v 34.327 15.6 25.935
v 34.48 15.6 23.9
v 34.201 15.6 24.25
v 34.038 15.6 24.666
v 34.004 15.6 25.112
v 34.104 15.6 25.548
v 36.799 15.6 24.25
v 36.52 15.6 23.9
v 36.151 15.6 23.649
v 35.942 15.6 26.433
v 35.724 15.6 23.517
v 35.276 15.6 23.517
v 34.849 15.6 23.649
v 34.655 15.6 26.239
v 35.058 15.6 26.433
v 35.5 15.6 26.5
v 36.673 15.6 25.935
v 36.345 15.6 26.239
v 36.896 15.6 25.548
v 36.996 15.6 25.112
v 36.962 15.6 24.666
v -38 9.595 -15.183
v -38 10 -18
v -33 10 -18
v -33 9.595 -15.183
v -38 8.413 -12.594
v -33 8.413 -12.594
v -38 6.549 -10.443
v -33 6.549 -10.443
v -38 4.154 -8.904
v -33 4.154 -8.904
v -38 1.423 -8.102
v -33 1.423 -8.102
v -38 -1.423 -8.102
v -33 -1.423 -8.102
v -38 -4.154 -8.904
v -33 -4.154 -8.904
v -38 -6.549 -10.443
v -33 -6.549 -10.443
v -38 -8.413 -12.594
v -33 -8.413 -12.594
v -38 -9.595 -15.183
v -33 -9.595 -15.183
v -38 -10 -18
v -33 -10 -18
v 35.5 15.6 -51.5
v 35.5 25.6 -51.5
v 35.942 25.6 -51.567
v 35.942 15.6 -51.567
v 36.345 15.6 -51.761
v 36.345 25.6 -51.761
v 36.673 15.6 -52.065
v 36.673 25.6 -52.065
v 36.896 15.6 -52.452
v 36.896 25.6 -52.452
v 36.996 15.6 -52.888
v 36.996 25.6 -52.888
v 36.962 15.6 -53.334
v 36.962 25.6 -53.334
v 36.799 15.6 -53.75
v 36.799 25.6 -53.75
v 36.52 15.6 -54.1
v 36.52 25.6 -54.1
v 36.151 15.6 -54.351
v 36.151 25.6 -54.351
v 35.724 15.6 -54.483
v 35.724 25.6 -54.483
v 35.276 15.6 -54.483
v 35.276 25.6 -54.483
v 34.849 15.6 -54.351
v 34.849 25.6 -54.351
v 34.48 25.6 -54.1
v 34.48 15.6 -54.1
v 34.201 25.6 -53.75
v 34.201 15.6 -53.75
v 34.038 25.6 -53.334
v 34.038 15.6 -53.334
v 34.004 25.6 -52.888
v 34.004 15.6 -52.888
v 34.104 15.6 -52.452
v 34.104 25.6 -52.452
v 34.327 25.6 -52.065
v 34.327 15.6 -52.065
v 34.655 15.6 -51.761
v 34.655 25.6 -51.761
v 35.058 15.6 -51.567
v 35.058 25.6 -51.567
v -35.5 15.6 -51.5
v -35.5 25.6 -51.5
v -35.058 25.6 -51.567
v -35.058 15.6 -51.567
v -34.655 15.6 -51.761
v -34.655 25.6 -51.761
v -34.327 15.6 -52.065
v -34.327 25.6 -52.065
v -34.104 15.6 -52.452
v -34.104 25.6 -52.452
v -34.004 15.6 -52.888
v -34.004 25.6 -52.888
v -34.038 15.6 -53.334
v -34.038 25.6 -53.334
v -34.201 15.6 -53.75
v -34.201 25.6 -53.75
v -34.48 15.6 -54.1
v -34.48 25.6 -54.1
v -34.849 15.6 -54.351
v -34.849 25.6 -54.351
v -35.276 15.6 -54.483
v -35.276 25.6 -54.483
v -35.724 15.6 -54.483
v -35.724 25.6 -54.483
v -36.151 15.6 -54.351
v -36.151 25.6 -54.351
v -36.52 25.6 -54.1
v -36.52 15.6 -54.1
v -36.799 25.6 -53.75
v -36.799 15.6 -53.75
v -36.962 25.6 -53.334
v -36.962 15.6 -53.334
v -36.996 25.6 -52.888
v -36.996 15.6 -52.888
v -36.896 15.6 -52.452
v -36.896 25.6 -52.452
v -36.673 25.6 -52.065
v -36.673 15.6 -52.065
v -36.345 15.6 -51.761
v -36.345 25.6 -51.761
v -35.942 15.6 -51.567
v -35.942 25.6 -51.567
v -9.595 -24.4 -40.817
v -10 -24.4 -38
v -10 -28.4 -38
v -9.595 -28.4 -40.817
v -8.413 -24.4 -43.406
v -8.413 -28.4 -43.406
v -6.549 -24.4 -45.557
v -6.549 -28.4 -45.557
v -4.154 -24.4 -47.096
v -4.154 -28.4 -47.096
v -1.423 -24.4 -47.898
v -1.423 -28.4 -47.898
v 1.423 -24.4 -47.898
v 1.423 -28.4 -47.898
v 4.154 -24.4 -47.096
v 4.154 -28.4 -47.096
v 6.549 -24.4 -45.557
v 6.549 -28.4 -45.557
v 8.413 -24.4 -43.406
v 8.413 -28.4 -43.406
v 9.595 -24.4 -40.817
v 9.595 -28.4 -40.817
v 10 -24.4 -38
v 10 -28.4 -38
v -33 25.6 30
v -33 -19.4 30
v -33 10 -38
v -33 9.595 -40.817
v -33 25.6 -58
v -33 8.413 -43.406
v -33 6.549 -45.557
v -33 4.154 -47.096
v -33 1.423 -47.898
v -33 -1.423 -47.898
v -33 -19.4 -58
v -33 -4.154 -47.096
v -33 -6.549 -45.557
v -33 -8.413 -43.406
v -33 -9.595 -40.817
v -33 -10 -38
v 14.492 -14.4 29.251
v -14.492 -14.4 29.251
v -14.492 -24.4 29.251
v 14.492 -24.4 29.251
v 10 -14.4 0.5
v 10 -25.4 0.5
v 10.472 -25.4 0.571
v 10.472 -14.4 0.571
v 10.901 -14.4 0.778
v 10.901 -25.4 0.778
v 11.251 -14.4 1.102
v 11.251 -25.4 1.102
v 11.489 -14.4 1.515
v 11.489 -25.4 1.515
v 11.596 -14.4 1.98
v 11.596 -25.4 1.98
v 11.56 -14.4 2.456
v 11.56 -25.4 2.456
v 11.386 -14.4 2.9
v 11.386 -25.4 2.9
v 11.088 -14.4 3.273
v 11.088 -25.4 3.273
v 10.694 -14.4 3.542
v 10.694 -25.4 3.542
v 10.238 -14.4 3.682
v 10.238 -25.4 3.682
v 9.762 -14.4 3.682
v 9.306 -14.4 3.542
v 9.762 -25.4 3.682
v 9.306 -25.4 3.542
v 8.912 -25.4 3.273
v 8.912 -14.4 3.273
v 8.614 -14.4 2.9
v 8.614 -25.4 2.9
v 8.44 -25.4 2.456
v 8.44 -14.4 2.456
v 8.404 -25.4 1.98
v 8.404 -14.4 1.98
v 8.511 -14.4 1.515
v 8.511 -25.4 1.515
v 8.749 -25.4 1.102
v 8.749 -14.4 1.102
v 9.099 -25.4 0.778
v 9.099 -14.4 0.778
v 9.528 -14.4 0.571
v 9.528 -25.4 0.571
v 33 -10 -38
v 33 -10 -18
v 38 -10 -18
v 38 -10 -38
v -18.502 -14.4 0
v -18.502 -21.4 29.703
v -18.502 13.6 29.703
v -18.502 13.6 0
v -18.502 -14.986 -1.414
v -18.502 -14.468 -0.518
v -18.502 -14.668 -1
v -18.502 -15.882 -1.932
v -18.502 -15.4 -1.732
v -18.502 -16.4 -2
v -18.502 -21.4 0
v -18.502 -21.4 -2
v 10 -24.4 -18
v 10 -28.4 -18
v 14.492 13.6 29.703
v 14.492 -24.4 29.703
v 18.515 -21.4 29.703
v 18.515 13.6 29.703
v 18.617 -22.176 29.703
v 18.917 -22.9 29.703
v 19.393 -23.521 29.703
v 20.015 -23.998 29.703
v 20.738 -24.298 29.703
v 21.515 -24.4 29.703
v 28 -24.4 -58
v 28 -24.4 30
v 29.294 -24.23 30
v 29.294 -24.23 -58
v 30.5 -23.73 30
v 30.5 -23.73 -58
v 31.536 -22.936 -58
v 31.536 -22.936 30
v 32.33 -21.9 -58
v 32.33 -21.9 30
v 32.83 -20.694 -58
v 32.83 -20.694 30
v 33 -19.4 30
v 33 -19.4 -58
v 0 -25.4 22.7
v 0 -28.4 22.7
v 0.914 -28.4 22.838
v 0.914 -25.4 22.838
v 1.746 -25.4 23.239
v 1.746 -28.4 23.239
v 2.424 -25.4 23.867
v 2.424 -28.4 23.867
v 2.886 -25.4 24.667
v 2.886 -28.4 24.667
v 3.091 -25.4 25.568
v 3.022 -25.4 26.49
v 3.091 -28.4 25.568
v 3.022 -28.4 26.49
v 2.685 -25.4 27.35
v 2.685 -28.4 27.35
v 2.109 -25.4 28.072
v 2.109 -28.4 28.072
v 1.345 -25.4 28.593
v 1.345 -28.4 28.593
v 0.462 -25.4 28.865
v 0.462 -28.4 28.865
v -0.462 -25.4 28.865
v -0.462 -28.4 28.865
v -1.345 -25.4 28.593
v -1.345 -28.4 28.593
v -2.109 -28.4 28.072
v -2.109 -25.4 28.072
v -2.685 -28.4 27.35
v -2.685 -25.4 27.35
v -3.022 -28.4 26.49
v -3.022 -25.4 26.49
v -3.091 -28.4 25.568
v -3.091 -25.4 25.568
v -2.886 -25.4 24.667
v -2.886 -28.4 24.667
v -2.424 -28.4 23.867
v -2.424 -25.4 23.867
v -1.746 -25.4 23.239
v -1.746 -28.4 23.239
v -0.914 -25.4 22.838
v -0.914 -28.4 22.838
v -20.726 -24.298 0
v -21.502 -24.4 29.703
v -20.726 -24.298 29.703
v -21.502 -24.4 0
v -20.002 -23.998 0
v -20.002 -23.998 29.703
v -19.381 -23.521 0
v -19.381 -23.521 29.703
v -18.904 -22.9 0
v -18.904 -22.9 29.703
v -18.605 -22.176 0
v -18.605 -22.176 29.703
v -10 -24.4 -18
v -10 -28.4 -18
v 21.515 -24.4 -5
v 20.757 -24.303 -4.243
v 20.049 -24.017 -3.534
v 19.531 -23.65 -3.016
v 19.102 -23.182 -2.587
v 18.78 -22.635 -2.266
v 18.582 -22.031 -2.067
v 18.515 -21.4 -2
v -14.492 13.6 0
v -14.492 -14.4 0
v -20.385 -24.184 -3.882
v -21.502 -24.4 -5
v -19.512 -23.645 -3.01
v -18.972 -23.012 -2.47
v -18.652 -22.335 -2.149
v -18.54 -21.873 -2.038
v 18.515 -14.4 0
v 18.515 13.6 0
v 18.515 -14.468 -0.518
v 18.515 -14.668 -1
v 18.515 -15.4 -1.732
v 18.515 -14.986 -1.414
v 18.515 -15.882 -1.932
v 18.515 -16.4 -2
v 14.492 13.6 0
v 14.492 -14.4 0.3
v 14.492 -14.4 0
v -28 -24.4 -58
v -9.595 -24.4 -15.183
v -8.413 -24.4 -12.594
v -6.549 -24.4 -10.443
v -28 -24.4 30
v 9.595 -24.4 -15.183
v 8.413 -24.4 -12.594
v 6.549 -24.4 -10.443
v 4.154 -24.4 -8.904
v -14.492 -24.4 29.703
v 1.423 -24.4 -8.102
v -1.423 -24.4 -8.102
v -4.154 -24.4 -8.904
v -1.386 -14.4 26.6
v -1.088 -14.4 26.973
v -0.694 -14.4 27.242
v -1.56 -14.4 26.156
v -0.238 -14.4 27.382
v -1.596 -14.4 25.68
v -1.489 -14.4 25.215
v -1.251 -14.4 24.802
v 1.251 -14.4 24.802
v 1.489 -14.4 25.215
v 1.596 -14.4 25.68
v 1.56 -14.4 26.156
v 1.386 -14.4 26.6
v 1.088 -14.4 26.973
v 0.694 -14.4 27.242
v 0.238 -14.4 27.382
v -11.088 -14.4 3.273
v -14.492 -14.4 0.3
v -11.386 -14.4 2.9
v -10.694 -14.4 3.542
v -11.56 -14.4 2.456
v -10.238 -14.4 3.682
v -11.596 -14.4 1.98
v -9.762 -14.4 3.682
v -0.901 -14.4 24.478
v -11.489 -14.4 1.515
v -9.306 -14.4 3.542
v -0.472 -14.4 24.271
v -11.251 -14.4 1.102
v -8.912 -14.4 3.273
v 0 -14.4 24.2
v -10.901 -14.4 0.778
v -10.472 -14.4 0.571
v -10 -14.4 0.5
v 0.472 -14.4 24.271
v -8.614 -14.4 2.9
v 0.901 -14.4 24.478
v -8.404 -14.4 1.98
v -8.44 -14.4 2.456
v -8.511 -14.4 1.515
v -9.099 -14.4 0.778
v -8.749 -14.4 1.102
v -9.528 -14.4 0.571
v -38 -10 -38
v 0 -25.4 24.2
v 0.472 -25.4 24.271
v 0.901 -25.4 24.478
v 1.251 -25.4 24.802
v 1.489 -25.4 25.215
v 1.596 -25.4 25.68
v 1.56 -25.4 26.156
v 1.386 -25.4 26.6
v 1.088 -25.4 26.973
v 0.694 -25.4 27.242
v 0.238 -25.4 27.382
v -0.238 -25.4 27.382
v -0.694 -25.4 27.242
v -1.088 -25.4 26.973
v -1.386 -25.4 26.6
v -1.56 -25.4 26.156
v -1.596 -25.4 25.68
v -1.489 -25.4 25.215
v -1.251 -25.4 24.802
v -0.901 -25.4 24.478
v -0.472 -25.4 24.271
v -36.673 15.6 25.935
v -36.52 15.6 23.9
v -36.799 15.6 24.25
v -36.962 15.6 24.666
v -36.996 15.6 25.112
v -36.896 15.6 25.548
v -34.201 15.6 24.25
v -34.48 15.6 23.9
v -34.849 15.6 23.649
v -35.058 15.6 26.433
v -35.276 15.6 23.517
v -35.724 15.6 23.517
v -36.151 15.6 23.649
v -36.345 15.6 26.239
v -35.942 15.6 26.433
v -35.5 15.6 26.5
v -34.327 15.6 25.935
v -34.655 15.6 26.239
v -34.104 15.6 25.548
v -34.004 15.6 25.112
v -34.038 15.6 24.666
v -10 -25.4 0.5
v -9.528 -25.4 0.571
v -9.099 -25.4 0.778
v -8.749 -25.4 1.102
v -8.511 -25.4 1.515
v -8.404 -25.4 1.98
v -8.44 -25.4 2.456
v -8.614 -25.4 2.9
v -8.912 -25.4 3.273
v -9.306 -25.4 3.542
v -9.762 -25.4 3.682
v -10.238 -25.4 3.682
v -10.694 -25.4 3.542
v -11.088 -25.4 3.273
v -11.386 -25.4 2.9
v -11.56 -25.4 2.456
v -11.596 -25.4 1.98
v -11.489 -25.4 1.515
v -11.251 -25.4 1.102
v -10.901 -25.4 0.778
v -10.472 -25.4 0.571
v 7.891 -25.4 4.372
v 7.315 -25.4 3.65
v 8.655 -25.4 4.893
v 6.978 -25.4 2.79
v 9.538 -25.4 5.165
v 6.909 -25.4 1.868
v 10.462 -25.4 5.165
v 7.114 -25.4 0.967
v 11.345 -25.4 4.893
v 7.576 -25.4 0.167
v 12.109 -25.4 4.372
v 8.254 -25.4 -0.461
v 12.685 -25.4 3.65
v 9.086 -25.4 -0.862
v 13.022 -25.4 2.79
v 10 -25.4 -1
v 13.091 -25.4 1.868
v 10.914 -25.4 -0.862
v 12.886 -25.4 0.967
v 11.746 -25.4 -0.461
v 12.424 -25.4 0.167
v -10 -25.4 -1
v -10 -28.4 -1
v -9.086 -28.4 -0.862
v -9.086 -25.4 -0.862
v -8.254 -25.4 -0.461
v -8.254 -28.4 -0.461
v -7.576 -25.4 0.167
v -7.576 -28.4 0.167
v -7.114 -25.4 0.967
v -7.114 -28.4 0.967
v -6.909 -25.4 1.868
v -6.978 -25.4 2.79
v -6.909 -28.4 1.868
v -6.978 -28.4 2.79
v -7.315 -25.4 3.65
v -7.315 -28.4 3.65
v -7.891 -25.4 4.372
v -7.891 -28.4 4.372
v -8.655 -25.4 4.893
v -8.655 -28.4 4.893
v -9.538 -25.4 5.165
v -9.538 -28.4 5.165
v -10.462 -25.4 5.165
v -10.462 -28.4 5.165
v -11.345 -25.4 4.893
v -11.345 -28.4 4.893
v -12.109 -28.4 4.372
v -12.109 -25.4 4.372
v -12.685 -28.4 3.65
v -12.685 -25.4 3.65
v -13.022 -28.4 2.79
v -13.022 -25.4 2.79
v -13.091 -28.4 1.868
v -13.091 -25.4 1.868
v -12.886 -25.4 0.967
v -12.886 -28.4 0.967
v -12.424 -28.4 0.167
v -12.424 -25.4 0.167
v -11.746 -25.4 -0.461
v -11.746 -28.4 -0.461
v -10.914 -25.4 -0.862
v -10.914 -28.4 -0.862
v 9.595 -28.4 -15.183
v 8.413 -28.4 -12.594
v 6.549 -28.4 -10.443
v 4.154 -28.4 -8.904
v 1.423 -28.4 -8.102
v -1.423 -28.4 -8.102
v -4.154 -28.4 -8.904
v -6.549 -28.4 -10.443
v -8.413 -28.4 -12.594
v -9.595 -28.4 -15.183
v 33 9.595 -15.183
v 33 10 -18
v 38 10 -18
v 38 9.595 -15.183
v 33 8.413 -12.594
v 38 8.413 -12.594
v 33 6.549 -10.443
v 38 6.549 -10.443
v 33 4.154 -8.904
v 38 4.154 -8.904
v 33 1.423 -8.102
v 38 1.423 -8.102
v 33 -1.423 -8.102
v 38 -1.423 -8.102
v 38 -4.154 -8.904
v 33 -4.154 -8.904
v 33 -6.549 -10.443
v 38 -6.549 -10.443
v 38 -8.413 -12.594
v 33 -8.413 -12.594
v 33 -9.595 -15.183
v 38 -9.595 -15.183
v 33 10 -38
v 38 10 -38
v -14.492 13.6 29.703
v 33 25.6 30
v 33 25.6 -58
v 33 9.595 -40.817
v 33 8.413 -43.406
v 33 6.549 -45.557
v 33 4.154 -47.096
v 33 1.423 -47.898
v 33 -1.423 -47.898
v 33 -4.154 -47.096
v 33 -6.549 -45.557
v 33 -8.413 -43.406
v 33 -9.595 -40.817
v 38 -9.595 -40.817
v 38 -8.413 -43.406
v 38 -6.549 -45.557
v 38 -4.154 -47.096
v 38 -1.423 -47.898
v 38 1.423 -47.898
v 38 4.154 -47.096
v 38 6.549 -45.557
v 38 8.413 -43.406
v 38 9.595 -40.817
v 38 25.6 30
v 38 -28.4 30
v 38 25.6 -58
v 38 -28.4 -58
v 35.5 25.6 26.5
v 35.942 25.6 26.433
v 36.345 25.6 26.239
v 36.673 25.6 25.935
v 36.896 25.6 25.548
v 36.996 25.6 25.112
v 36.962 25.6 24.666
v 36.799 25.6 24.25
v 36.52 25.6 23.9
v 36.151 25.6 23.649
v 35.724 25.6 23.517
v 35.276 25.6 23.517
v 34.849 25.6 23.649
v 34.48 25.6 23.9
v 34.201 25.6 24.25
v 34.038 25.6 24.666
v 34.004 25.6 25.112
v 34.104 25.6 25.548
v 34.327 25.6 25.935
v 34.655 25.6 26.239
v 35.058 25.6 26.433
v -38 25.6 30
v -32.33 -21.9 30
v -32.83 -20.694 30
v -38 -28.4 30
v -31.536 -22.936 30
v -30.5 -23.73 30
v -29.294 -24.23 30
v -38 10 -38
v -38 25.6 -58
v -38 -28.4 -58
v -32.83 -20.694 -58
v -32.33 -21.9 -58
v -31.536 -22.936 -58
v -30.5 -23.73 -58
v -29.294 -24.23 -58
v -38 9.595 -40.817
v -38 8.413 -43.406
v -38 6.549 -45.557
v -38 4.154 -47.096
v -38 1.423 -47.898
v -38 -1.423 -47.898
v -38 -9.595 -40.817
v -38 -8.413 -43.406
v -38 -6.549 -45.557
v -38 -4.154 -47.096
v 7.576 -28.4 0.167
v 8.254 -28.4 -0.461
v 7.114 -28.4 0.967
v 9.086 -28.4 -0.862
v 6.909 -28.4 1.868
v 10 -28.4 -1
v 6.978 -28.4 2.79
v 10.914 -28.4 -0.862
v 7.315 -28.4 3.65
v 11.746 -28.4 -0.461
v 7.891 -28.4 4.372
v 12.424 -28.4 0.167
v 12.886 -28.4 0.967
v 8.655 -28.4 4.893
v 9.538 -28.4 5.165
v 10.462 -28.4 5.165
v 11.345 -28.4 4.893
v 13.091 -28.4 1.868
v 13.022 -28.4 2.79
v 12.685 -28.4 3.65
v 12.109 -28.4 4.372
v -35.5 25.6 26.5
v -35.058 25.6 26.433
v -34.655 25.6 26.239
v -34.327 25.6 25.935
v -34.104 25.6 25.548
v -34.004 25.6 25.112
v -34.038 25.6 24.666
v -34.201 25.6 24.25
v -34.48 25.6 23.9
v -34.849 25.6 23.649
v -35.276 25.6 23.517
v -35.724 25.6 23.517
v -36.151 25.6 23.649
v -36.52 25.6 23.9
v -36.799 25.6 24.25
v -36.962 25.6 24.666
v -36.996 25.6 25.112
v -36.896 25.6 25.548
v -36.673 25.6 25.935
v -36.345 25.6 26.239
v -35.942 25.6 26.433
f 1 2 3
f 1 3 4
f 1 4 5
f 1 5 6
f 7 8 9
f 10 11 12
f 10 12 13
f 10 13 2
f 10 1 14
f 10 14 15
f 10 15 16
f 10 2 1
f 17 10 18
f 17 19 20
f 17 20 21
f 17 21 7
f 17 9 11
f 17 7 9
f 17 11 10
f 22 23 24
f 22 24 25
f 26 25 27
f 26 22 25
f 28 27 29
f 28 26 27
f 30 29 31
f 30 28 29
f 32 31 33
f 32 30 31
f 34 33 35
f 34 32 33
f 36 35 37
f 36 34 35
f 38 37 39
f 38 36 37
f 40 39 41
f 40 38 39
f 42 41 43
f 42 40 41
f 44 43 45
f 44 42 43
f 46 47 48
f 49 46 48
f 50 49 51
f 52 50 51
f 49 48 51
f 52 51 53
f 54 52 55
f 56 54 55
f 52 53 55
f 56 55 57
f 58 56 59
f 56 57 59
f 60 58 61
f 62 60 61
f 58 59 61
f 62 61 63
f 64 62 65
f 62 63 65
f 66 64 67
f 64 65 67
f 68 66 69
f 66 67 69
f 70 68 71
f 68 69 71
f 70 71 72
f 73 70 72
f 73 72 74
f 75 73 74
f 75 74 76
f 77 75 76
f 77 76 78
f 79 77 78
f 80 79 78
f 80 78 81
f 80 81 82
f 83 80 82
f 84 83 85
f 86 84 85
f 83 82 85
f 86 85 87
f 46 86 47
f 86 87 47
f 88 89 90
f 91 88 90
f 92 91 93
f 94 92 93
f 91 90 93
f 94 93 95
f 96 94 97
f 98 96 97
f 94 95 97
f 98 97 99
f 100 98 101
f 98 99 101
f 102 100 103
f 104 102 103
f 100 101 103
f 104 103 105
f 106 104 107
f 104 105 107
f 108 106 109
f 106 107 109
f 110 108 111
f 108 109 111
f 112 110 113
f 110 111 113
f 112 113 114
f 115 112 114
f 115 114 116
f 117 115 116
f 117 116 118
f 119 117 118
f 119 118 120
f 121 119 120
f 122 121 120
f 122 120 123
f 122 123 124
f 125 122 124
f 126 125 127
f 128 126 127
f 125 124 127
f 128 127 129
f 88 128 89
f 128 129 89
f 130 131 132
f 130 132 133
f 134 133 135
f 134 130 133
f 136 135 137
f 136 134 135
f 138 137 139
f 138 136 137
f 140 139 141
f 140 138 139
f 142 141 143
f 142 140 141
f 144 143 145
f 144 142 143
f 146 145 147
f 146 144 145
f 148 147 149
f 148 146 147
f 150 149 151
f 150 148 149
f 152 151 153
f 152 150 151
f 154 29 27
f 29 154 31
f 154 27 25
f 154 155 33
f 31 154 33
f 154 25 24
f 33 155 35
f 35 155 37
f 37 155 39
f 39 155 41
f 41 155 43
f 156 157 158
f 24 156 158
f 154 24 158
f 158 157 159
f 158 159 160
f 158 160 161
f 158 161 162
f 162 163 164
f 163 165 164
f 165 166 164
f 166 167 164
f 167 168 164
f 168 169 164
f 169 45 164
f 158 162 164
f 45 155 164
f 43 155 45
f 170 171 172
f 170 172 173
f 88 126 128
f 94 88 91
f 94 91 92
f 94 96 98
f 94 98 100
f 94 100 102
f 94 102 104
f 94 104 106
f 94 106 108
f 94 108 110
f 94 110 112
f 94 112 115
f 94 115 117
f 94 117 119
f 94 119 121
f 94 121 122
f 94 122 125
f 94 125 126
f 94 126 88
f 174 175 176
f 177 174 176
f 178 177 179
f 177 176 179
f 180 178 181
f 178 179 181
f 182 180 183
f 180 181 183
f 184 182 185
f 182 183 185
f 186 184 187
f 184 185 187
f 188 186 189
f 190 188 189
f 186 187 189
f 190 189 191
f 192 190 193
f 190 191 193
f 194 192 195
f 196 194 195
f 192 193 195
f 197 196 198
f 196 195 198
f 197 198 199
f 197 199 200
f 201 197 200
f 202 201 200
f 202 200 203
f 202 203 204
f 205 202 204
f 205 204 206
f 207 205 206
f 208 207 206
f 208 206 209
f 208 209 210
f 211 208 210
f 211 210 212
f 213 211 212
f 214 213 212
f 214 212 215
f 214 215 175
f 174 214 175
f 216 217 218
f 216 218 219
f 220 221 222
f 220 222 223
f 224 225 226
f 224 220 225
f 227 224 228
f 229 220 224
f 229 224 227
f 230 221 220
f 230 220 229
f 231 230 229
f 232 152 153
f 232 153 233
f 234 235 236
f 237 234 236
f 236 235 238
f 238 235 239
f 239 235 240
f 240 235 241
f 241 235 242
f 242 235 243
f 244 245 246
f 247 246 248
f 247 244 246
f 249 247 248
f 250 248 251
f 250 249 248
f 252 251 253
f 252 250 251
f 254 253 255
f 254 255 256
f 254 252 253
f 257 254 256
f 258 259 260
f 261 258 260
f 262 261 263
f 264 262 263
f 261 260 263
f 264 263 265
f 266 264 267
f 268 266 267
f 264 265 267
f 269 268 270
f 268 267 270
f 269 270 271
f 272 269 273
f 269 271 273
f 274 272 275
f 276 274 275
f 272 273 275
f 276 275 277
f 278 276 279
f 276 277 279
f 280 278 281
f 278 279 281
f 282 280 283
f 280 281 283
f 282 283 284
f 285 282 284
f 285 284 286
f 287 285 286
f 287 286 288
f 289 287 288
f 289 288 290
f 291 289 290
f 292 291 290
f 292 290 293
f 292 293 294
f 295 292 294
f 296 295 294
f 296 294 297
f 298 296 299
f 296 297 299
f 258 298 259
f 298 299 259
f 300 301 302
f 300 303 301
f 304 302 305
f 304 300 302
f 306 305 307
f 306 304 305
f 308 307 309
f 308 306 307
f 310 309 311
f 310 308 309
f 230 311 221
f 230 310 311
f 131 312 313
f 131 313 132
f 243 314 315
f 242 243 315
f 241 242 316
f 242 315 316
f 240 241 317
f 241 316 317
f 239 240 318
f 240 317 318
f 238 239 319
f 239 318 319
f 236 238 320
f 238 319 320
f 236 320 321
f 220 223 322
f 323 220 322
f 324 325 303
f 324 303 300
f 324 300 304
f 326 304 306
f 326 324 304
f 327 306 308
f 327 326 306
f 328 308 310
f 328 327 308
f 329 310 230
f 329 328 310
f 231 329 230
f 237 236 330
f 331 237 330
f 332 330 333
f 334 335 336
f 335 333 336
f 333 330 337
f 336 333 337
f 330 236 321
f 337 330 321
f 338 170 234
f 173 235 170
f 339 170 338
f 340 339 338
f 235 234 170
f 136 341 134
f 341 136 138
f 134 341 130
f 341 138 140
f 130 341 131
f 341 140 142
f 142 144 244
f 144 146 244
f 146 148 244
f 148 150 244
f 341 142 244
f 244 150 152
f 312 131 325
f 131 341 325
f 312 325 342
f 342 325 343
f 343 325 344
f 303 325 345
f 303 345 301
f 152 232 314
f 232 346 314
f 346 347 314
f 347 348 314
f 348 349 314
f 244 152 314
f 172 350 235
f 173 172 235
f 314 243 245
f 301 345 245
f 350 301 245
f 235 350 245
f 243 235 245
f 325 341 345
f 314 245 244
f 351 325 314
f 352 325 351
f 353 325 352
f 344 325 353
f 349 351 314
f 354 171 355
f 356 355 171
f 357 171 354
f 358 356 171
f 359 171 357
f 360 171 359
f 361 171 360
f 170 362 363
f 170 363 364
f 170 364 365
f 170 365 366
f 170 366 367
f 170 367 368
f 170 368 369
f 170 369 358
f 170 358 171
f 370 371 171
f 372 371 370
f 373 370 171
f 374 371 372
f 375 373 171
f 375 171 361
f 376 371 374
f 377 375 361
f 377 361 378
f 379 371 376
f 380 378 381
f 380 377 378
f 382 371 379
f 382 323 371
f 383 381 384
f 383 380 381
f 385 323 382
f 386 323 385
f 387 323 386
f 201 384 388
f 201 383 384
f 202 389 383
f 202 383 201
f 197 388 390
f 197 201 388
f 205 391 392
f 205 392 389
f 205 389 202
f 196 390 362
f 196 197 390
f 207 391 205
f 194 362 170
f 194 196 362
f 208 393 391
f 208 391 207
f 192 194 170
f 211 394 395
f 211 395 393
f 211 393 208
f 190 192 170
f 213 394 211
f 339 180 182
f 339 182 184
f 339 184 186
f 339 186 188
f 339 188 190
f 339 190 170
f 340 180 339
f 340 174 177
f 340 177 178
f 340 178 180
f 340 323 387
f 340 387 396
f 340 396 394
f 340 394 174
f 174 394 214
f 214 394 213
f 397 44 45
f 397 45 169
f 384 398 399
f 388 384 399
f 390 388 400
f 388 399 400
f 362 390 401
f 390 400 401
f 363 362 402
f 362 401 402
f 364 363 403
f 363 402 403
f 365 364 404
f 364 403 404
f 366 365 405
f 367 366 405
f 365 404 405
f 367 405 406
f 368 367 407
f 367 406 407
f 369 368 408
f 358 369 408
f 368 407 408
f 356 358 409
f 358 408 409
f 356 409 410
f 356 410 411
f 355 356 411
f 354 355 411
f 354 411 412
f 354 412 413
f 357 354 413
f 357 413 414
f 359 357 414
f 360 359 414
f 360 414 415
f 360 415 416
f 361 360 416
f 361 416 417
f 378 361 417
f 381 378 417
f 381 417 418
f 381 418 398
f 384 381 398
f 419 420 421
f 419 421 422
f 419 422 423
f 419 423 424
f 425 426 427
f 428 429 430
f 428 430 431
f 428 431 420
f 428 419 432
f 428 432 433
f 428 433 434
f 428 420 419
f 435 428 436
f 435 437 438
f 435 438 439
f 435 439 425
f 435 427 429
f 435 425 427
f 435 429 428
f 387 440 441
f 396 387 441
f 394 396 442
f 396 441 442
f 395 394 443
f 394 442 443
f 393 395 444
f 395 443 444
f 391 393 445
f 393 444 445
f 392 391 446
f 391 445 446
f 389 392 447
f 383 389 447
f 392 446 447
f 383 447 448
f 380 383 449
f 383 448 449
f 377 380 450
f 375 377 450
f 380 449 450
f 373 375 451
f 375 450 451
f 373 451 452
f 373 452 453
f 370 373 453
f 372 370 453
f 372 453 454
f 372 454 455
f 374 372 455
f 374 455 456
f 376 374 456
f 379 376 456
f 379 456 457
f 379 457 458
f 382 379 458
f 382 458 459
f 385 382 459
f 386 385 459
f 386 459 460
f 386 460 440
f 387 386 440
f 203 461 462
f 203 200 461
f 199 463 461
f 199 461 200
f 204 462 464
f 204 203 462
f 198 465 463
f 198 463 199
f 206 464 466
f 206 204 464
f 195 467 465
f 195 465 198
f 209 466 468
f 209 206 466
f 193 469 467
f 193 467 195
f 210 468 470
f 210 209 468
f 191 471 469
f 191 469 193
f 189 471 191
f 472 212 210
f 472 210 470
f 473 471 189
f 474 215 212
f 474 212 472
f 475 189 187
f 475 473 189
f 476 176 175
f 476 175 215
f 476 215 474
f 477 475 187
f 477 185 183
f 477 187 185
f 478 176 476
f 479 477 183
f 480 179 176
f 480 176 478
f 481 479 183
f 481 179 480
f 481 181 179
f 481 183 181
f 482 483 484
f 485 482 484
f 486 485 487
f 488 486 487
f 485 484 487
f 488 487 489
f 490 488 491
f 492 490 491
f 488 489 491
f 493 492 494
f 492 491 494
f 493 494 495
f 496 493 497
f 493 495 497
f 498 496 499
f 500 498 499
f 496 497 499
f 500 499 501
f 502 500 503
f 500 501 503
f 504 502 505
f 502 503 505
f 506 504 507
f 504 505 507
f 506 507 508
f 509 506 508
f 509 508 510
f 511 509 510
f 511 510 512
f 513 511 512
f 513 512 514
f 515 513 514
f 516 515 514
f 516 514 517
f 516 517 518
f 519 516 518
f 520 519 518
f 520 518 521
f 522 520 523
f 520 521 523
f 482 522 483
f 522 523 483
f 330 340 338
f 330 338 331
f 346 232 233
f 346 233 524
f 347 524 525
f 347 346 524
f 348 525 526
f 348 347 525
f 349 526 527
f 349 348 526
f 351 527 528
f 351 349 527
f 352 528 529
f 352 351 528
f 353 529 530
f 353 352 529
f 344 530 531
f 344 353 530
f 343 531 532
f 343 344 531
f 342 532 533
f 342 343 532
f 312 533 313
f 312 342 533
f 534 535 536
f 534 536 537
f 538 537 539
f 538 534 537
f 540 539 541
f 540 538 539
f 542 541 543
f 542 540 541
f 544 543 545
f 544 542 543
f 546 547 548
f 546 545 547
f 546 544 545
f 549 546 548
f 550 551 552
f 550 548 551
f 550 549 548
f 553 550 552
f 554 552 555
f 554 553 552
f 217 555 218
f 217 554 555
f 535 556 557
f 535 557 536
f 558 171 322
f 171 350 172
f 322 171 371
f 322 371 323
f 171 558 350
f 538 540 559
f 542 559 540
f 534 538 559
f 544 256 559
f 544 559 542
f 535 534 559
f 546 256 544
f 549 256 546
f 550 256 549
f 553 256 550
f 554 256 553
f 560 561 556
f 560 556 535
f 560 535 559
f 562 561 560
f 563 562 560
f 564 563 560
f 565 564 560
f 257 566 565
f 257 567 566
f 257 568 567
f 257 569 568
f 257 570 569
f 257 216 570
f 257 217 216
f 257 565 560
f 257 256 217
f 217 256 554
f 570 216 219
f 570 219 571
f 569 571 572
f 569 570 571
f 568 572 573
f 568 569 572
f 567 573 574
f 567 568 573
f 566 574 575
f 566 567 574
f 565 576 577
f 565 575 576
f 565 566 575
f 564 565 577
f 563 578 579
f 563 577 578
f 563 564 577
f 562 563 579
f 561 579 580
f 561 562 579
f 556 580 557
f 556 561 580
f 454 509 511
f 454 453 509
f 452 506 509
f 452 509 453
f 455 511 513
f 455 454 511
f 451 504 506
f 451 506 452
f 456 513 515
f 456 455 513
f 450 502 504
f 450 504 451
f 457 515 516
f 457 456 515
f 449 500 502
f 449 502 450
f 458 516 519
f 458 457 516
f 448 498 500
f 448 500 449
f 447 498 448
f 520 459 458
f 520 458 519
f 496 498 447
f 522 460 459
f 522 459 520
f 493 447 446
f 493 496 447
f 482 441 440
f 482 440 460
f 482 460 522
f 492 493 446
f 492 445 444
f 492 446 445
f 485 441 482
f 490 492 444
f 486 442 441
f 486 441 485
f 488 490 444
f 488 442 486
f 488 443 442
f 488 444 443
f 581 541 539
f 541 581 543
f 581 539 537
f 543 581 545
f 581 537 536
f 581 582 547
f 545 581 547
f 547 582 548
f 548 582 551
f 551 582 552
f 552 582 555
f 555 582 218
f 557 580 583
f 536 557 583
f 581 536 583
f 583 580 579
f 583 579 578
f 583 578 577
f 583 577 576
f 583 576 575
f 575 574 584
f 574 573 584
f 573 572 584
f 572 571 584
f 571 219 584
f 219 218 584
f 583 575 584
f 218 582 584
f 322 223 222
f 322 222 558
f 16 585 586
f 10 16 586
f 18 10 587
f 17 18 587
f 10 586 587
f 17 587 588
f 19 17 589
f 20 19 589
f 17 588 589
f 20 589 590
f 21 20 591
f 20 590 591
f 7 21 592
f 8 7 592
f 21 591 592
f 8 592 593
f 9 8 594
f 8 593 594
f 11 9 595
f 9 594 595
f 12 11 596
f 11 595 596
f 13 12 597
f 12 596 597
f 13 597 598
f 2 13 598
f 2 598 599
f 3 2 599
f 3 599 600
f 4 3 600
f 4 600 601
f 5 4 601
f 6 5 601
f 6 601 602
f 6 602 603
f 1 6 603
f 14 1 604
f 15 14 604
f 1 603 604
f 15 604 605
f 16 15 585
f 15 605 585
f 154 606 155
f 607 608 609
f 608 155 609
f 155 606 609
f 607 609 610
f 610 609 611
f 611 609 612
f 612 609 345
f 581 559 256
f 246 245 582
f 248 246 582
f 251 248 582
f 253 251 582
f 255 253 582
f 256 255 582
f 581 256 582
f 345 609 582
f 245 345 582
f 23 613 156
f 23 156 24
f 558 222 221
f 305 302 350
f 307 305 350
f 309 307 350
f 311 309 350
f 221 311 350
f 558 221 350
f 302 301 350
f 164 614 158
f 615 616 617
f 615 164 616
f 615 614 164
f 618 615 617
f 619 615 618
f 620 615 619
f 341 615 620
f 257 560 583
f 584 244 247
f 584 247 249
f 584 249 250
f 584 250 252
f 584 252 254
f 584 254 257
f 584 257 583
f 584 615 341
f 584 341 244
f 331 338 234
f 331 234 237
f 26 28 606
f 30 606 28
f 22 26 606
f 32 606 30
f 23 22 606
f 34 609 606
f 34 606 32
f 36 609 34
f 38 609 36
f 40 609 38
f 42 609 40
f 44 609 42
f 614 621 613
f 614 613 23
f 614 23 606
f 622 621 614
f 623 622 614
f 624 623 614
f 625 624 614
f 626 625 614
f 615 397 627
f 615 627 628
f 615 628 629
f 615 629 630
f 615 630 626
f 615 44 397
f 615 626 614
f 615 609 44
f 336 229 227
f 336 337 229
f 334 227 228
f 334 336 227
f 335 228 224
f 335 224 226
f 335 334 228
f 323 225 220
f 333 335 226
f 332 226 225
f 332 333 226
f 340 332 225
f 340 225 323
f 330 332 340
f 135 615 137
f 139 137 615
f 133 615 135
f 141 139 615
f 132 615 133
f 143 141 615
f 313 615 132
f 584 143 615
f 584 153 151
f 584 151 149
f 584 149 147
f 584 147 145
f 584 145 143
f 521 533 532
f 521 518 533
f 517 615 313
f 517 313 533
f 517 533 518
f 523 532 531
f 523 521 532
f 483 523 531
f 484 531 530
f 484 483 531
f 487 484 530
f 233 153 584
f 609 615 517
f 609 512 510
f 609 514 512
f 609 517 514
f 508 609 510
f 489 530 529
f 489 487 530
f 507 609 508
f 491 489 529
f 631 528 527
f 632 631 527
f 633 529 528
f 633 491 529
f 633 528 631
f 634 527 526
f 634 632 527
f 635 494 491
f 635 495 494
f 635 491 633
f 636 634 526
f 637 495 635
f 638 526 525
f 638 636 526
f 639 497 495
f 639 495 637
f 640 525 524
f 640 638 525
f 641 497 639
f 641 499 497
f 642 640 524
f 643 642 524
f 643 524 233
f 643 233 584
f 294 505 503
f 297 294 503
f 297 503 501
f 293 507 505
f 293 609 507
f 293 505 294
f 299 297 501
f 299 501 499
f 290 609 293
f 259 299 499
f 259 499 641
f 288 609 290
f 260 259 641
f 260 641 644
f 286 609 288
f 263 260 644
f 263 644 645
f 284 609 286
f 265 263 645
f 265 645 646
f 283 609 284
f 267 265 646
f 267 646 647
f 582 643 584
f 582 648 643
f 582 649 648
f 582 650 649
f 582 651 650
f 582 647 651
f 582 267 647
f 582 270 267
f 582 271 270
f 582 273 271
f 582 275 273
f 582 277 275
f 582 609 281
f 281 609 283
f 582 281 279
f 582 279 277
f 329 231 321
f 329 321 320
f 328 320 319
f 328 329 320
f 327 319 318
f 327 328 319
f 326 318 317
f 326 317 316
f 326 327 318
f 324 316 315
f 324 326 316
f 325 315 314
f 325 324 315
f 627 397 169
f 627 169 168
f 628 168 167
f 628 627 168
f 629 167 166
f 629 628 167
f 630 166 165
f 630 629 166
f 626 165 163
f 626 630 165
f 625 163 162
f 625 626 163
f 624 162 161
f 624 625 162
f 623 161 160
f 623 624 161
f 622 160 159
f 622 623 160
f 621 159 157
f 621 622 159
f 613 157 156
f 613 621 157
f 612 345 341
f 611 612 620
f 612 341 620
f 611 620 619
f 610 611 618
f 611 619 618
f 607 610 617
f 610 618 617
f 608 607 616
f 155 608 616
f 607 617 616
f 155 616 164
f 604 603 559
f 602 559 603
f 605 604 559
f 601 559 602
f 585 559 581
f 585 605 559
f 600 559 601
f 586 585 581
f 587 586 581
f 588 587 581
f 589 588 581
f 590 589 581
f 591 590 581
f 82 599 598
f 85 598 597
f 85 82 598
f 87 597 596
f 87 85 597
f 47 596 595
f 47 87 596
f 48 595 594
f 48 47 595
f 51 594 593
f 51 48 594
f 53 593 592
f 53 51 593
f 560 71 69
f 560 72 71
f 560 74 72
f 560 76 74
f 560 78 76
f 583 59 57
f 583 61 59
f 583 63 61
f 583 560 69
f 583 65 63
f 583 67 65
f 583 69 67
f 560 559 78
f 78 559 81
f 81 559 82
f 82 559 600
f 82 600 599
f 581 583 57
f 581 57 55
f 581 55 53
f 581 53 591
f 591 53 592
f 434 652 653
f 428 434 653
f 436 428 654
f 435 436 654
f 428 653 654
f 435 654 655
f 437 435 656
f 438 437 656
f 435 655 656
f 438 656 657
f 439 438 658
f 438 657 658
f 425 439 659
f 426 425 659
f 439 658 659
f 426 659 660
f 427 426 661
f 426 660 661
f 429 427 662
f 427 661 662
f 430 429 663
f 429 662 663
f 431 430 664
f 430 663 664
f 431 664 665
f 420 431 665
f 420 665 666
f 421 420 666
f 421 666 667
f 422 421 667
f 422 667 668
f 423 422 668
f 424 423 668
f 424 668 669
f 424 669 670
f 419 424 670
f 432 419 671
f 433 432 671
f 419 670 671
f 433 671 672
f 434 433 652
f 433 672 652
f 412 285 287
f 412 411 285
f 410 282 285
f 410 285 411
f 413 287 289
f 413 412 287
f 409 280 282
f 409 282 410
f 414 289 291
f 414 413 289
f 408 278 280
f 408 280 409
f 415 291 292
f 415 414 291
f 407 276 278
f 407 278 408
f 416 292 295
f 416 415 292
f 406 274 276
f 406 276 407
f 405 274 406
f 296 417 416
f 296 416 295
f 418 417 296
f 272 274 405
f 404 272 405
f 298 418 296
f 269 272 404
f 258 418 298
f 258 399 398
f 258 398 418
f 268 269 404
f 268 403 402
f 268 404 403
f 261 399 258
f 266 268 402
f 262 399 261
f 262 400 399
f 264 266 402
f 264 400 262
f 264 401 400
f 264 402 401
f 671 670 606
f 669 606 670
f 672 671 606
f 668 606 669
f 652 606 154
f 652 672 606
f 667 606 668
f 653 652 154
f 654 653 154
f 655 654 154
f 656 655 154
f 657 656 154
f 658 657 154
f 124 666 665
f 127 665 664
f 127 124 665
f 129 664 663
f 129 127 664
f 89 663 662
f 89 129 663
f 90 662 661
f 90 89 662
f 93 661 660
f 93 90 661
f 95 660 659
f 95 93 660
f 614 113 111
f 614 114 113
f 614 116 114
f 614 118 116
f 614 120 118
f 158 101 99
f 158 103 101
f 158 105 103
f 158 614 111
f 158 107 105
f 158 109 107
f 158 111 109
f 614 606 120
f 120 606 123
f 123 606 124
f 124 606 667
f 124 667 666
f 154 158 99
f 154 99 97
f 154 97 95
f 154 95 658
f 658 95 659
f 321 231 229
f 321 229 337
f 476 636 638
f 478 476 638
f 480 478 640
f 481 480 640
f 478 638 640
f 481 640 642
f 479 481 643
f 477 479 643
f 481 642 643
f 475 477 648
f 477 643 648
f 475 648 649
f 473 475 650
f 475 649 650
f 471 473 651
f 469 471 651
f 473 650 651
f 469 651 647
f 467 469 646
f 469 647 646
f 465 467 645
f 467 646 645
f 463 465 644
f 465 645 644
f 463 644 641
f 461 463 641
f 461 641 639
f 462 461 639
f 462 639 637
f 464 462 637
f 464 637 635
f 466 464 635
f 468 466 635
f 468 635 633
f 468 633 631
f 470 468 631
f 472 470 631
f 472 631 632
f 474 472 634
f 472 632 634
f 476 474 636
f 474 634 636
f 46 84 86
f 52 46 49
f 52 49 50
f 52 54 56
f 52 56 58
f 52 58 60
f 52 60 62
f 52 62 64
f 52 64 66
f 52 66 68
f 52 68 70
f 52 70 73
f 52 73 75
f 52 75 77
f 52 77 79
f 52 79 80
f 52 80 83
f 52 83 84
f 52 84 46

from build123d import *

# Parameters (mm, degrees)
SKETCH_6_W           = 28.99281841
SKETCH_6_H           = 28.951324053
EXTRUDE_2_DEPTH      = 10
SKETCH_8_W           = 76
SKETCH_8_H           = 88
EXTRUDE_3_DEPTH      = 4
SKETCH_4_R           = 1.55
CUT_EXTRUDE_2_DEPTH  = 15
SKETCH_5_R           = 1.55
CUT_EXTRUDE_3_DEPTH  = 15
SKETCH_10_W          = 4.022554567
SKETCH_10_H          = 29.702617941
EXTRUDE_9_DEPTH      = 38
SKETCH_11_W          = 4.010171553
SKETCH_11_H          = 29.702617961
EXTRUDE_10_DEPTH     = 38
SKETCH_14_W          = 5
SKETCH_14_H          = 88
EXTRUDE_14_DEPTH     = 50
SKETCH_15_W          = 5
SKETCH_15_H          = 88
EXTRUDE_15_DEPTH     = 50
SKETCH_21_R          = 1.4
CUT_EXTRUDE_8_DEPTH  = 8
CUT_EXTRUDE_9_DEPTH  = 80
CUT_EXTRUDE_11_DEPTH = 80
FILLET_1_R           = 5
FILLET_2_R           = 5
SKETCH_24_W          = 28.984243656
SKETCH_24_H          = 0.299988544
EXTRUDE_16_DEPTH     = 10
SKETCH_25_W          = 37.016969776
SKETCH_25_H          = 2
EXTRUDE_18_DEPTH     = 10
FILLET_7_R           = 2
FILLET_8_R           = 3
FILLET_9_R           = 3
FILLET_10_R          = 3
SKETCH_19_R          = 3.1
CUT_EXTRUDE_12_DEPTH = 3
SKETCH_27_R          = 1.5
CUT_EXTRUDE_13_DEPTH = 10
SKETCH_28_R          = 1.6
CUT_EXTRUDE_15_DEPTH = 15


with BuildPart() as part:
    # 草图6 → 凸台-拉伸2 (new body)
    with BuildSketch(Plane.XZ.offset(14.4)):
        with Locations((0.000972868, 14.775650571)):
            Rectangle(SKETCH_6_W, SKETCH_6_H)
    extrude(amount=EXTRUDE_2_DEPTH)

    # 草图8 → 凸台-拉伸3 (add)
    with BuildSketch(Plane.XZ.offset(24.4)):
        with Locations((1e-09, -13.999999049)):
            Rectangle(SKETCH_8_W, SKETCH_8_H)
    extrude(amount=EXTRUDE_3_DEPTH)

    # 草图4 → 切除-拉伸2 (cut)
    with BuildSketch(Plane.XZ.offset(14.4)):
        with Locations(Location((-10, 2.1, 0), (0, 0, 270))):
            Circle(SKETCH_4_R)
        with Locations(Location((10, 2.1, 0), (0, 0, 270))):
            Circle(SKETCH_4_R)
    extrude(amount=CUT_EXTRUDE_2_DEPTH, mode=Mode.SUBTRACT)

    # 草图5 → 切除-拉伸3 (cut)
    with BuildSketch(Plane.XZ.offset(14.4)):
        with Locations(Location((0, 25.8, 0), (0, 0, 270))):
            Circle(SKETCH_5_R)
    extrude(amount=CUT_EXTRUDE_3_DEPTH, mode=Mode.SUBTRACT)

    # 草图10 → 凸台-拉伸9 (add)
    with BuildSketch(Plane(origin=(0, -24.4, 0), x_dir=(1, 0, 0), z_dir=(0, 1, 0))):
        with Locations((16.503397967, -14.851308971)):
            Rectangle(SKETCH_10_W, SKETCH_10_H)
    extrude(amount=EXTRUDE_9_DEPTH)

    # 草图11 → 凸台-拉伸10 (add)
    with BuildSketch(Plane(origin=(0, -24.4, 0), x_dir=(1, 0, 0), z_dir=(0, 1, 0))):
        with Locations((-16.497208749, -14.851308981)):
            Rectangle(SKETCH_11_W, SKETCH_11_H)
    extrude(amount=EXTRUDE_10_DEPTH)

    # 草图14 → 凸台-拉伸14 (add)
    with BuildSketch(Plane(origin=(0, -24.4, 0), x_dir=(1, 0, 0), z_dir=(0, 1, 0))):
        with Locations((-35.499999999, 13.999999049)):
            Rectangle(SKETCH_14_W, SKETCH_14_H)
    extrude(amount=EXTRUDE_14_DEPTH)

    # 草图15 → 凸台-拉伸15 (add)
    with BuildSketch(Plane(origin=(0, -24.4, 0), x_dir=(1, 0, 0), z_dir=(0, 1, 0))):
        with Locations((35.500000001, 13.999999049)):
            Rectangle(SKETCH_15_W, SKETCH_15_H)
    extrude(amount=EXTRUDE_15_DEPTH)

    # 草图21 → 切除-拉伸8 (cut)
    with BuildSketch(Plane(origin=(0, 25.6, 0), x_dir=(1, 0, 0), z_dir=(0, 1, 0))):
        with Locations(Location((-35.499999999, 52.999999049, 0), (0, 0, 270))):
            Circle(SKETCH_21_R)
        with Locations(Location((-35.499999999, -25.000000951, 0), (0, 0, 270))):
            Circle(SKETCH_21_R)
        with Locations(Location((35.500000001, 52.999999049, 0), (0, 0, 270))):
            Circle(SKETCH_21_R)
        with Locations(Location((35.500000001, -25.000000951, 0), (0, 0, 270))):
            Circle(SKETCH_21_R)
    extrude(amount=-CUT_EXTRUDE_8_DEPTH, mode=Mode.SUBTRACT)

    # 草图22 → 切除-拉伸9 (cut)
    with BuildSketch(Plane.ZY.offset(37.999999999)):
        with BuildLine():
            Line((-37.999999049, 10), (-17.999999049, 10))
            ThreePointArc((-17.999999049, 10), (-7.999999049, 0), (-17.999999049, -10))
            Line((-17.999999049, -10), (-37.999999049, -10))
            ThreePointArc((-37.999999049, -10), (-47.999999049, 0), (-37.999999049, 10))
        make_face()
    extrude(amount=-CUT_EXTRUDE_9_DEPTH, mode=Mode.SUBTRACT)

    # 草图23 → 切除-拉伸11 (cut)
    with BuildSketch(Plane(origin=(0, -24.4, 0), x_dir=(1, 0, 0), z_dir=(0, 1, 0))):
        with BuildLine():
            Line((10, 37.999999049), (10, 17.999999049))
            ThreePointArc((10, 17.999999049), (0, 7.999999049), (-10, 17.999999049))
            Line((-10, 17.999999049), (-10, 37.999999049))
            ThreePointArc((-10, 37.999999049), (0, 47.999999049), (10, 37.999999049))
        make_face()
    extrude(amount=-CUT_EXTRUDE_11_DEPTH, mode=Mode.SUBTRACT)

    # 圆角1
    fillet_1_edges = [part.edges().sort_by_distance(p)[0] for p in [
        (-32.999999999, -24.4, -13.999999049),
    ]]
    fillet(fillet_1_edges, radius=FILLET_1_R)

    # 圆角2
    fillet_2_edges = [part.edges().sort_by_distance(p)[0] for p in [
        (33.000000001, -24.4, -13.999999049),
    ]]
    fillet(fillet_2_edges, radius=FILLET_2_R)

    # 草图24 → 凸台-拉伸16 (add)
    with BuildSketch(Plane(origin=(0, -24.4, 0), x_dir=(1, 0, 0), z_dir=(0, 1, 0))):
        with Locations((-1.144e-06, -0.149994272)):
            Rectangle(SKETCH_24_W, SKETCH_24_H)
    extrude(amount=EXTRUDE_16_DEPTH)

    # 草图25 → 凸台-拉伸18 (add)
    with BuildSketch(Plane(origin=(0, -24.4, 0), x_dir=(1, 0, 0), z_dir=(0, 1, 0))):
        with Locations((0.006190363, 1)):
            Rectangle(SKETCH_25_W, SKETCH_25_H)
    extrude(amount=EXTRUDE_18_DEPTH)

    # 圆角7
    fillet_7_edges = [part.edges().sort_by_distance(p)[0] for p in [
        (0.006190363, -14.4, -2),
    ]]
    fillet(fillet_7_edges, radius=FILLET_7_R)

    # 圆角8
    fillet_8_edges = [part.edges().sort_by_distance(p)[0] for p in [
        (18.514675251, -24.4, 13.85130897),
    ]]
    fillet(fillet_8_edges, radius=FILLET_8_R)

    # 圆角9
    fillet_9_edges = [part.edges().sort_by_distance(p)[0] for p in [
        (1.506190363, -24.4, -2),
    ]]
    fillet(fillet_9_edges, radius=FILLET_9_R)

    # 圆角10
    fillet_10_edges = [part.edges().sort_by_distance(p)[0] for p in [
        (-18.502294525, -24.4, 12.35130898),
    ]]
    fillet(fillet_10_edges, radius=FILLET_10_R)

    # 草图19 → 切除-拉伸12 (cut)
    with BuildSketch(Plane.XZ.offset(28.4)):
        with Locations(Location((0, 25.8, 0), (0, 0, 270))):
            Circle(SKETCH_19_R)
        with Locations(Location((-10, 2.1, 0), (0, 0, 270))):
            Circle(SKETCH_19_R)
        with Locations(Location((10, 2.1, 0), (0, 0, 270))):
            Circle(SKETCH_19_R)
    extrude(amount=-CUT_EXTRUDE_12_DEPTH, mode=Mode.SUBTRACT)

    # 草图27 → 切除-拉伸13 (cut)
    with BuildSketch(Plane(origin=(0, 25.6, 0), x_dir=(1, 0, 0), z_dir=(0, 1, 0))):
        with Locations(Location((35.500000001, 52.999999049, 0), (0, 0, 270))):
            Circle(SKETCH_27_R)
        with Locations(Location((-35.499999999, 52.999999049, 0), (0, 0, 270))):
            Circle(SKETCH_27_R)
        with Locations(Location((-35.499999999, -25.000000951, 0), (0, 0, 270))):
            Circle(SKETCH_27_R)
        with Locations(Location((35.500000001, -25.000000951, 0), (0, 0, 270))):
            Circle(SKETCH_27_R)
    extrude(amount=-CUT_EXTRUDE_13_DEPTH, mode=Mode.SUBTRACT)

    # 草图28 → 切除-拉伸15 (cut)
    with BuildSketch(Plane.XZ.offset(28.4)):
        with Locations(Location((-10, 2.1, 0), (0, 0, 270))):
            Circle(SKETCH_28_R)
        with Locations(Location((10, 2.1, 0), (0, 0, 270))):
            Circle(SKETCH_28_R)
        with Locations(Location((0, 25.8, 0), (0, 0, 270))):
            Circle(SKETCH_28_R)
    extrude(amount=-CUT_EXTRUDE_15_DEPTH, mode=Mode.SUBTRACT)


solid = part.part
